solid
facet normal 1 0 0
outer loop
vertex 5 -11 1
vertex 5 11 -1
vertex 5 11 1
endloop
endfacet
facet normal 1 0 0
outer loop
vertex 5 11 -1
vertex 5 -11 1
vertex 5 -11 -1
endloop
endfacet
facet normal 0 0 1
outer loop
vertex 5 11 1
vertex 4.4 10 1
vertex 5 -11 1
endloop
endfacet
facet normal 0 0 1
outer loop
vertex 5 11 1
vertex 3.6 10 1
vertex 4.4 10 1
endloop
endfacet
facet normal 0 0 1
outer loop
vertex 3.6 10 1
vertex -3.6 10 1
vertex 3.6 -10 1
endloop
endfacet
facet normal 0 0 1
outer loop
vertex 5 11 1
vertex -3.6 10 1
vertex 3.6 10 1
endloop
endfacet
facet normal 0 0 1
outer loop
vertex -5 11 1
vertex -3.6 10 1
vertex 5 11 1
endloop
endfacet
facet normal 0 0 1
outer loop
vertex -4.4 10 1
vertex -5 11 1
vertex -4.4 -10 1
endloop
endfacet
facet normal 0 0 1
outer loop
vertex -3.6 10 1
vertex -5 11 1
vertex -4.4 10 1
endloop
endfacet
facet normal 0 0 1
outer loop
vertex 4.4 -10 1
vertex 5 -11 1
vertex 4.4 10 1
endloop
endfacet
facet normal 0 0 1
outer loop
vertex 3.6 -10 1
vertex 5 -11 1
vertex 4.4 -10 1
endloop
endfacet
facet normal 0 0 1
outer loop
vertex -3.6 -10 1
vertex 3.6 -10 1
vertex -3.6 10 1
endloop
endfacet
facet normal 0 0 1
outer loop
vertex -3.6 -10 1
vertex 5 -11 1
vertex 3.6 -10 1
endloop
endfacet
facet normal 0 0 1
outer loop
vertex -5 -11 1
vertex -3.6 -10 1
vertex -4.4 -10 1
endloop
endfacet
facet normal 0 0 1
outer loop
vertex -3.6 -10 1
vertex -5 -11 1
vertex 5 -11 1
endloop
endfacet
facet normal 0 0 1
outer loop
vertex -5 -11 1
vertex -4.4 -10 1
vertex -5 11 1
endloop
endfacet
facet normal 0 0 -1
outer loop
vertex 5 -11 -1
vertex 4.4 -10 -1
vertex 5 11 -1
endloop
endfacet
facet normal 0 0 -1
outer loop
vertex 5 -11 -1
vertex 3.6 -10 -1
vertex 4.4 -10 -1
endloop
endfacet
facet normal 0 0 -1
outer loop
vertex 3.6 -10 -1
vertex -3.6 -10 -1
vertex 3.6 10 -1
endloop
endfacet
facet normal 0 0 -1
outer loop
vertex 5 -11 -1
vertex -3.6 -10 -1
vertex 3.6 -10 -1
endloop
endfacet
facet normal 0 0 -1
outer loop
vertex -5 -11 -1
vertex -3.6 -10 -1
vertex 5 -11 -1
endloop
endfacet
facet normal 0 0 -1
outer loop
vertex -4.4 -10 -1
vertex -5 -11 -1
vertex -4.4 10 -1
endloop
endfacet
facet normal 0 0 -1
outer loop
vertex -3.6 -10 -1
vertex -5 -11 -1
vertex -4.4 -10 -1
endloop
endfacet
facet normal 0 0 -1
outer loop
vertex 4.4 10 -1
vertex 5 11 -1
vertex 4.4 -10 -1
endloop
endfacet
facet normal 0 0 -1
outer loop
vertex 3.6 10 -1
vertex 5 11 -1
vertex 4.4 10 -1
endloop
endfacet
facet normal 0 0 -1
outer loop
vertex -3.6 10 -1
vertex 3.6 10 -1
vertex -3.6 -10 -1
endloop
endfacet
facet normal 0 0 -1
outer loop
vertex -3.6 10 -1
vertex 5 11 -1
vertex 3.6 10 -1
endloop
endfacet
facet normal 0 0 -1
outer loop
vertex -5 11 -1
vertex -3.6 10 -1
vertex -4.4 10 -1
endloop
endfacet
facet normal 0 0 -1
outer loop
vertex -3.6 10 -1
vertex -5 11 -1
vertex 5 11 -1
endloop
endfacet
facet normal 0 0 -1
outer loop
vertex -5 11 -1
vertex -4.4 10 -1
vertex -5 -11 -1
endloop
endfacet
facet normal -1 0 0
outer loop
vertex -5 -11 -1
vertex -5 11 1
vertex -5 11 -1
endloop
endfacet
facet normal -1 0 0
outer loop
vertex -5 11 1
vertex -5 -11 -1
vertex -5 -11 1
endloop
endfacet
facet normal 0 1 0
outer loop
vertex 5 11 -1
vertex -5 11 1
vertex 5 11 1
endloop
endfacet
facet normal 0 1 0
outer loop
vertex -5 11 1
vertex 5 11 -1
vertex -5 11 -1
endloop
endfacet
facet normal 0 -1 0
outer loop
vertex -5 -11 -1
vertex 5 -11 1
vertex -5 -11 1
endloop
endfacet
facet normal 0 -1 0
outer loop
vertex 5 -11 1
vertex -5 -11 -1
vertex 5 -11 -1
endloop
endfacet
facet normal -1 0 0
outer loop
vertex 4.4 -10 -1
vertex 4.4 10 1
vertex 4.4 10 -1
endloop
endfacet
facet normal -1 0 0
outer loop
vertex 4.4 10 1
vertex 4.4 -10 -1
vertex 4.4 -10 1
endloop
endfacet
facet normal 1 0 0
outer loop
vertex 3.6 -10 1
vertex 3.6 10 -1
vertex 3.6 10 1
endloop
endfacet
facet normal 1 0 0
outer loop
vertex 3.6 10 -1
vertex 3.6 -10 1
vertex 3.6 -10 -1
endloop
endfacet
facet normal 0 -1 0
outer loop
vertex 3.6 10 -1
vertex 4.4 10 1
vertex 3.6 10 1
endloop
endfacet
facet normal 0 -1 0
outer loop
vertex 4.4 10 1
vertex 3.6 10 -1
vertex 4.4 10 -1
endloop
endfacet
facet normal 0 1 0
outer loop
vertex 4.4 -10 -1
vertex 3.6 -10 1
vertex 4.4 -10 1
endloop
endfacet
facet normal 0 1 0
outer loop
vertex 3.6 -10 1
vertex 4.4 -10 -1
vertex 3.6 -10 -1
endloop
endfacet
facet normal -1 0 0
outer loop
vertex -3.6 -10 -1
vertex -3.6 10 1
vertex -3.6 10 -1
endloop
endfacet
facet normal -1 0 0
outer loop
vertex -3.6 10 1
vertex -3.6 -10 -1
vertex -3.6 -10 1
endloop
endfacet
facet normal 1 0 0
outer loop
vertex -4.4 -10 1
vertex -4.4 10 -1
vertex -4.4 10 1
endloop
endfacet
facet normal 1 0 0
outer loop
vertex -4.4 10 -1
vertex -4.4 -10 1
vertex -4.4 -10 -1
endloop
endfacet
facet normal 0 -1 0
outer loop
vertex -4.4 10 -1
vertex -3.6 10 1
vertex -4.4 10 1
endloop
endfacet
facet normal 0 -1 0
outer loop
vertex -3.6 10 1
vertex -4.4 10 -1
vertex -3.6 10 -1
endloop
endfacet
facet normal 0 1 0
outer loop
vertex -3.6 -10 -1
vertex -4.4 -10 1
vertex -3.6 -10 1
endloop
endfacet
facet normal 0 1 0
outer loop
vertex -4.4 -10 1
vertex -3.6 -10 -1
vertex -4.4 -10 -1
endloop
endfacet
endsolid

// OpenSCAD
difference() {
    cube(size = [10, 22, 2], center = true);
    translate([4, 0, 0])
        cube([0.8, 20, 22], center = true);
    translate([-4, 0, 0])
        cube([0.8, 20, 22], center = true);
}
